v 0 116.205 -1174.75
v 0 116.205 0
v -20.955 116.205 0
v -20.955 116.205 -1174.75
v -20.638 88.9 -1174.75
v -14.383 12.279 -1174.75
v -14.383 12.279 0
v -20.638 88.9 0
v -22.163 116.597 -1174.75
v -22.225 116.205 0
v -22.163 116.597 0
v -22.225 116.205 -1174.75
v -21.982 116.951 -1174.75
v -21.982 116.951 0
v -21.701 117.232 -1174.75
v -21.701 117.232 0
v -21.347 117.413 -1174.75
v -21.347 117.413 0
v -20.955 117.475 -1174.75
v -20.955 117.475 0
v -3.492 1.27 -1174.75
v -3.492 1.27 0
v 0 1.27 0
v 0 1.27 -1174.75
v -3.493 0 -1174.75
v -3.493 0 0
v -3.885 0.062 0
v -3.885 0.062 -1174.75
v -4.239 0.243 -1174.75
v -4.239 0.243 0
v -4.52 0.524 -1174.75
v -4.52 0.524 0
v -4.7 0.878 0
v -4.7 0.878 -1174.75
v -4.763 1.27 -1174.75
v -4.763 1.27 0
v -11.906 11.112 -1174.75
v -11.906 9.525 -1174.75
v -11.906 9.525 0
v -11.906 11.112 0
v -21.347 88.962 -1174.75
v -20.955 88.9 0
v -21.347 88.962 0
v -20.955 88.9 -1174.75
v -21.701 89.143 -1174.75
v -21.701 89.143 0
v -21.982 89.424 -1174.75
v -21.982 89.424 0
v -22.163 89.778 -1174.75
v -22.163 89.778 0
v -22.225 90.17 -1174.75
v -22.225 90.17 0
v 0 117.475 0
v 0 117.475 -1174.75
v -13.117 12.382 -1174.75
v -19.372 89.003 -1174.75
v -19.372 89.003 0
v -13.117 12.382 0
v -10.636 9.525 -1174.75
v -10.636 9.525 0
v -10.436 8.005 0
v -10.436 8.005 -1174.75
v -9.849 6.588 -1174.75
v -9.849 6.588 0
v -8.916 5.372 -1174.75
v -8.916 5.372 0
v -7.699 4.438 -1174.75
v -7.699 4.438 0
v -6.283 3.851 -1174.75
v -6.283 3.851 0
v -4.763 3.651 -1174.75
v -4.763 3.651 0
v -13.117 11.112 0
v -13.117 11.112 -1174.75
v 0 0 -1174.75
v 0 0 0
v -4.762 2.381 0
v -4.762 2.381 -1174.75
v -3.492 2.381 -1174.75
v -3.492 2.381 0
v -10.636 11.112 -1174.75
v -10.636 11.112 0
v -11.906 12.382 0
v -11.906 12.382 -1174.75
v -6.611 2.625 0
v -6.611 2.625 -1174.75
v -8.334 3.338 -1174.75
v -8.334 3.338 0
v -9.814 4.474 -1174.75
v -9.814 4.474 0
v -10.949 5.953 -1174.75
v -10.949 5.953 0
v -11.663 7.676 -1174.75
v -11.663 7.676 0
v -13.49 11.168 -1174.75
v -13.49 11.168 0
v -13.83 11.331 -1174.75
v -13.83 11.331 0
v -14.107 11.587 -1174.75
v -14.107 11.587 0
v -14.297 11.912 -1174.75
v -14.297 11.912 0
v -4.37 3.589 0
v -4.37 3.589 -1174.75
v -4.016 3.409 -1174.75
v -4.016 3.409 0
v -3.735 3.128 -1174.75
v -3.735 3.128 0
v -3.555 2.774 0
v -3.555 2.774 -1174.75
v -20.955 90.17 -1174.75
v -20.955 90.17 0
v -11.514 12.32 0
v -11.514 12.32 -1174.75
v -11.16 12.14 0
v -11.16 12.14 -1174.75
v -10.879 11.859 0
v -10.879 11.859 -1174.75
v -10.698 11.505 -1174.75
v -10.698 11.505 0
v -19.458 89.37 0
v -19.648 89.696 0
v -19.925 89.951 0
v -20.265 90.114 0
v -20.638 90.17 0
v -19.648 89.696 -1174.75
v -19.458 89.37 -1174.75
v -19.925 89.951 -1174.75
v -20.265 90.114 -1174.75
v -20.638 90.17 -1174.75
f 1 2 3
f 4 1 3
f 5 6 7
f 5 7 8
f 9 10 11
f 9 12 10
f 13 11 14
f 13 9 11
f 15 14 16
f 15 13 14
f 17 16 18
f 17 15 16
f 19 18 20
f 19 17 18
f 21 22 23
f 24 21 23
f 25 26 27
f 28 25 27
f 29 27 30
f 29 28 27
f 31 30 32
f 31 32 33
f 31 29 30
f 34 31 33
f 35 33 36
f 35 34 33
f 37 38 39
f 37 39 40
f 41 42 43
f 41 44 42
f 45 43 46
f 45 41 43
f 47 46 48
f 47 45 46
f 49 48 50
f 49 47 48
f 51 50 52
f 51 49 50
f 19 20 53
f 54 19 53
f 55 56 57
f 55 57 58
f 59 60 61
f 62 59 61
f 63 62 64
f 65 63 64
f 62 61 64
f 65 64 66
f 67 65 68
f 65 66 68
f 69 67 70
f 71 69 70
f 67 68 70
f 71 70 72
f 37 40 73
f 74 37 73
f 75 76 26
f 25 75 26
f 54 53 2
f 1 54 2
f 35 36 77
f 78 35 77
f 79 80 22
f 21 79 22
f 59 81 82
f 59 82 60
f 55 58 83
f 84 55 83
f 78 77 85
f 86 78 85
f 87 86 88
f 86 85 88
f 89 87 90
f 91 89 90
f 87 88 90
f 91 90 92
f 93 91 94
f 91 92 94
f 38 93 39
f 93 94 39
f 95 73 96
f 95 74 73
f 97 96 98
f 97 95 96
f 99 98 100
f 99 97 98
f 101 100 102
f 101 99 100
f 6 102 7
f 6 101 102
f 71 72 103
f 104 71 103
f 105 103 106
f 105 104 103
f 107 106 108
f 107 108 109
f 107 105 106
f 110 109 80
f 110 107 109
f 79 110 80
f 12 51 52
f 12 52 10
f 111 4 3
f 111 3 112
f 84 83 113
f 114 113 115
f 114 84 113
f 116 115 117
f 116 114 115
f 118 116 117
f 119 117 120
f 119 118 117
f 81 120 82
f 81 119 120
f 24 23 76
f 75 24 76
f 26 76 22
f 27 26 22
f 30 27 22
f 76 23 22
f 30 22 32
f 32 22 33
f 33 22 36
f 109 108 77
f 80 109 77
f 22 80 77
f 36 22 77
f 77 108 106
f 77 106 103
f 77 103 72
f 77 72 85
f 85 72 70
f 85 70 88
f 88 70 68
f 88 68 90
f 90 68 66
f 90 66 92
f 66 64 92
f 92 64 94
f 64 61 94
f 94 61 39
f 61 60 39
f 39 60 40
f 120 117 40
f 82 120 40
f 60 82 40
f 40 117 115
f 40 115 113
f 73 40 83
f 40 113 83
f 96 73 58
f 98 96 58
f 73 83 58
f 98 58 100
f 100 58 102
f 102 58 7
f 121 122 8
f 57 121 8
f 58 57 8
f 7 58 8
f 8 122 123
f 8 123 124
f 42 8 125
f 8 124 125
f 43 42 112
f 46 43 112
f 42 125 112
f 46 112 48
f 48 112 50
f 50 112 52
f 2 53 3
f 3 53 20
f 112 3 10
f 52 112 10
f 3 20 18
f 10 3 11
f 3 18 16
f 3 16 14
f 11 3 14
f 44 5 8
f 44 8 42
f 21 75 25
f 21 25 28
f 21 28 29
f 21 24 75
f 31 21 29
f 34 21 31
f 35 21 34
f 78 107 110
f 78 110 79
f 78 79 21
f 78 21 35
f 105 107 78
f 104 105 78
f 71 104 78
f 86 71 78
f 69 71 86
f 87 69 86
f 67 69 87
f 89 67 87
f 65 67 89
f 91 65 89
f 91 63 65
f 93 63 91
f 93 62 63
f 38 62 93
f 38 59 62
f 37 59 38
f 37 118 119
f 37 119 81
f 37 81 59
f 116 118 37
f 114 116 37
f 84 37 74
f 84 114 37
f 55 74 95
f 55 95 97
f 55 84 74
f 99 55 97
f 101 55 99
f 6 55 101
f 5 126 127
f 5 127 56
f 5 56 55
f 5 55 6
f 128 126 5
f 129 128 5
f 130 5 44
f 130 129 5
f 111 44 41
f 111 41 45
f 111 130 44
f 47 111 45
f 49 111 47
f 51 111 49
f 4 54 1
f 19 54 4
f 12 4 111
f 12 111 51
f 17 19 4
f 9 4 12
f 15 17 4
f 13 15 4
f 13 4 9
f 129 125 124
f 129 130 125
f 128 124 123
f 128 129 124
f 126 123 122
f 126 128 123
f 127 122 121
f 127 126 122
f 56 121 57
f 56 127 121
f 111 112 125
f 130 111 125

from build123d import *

# Parameters (mm, degrees)
EXTRUDE_THIN1_DEPTH = 1174.75
FILLET1_R           = 1.27


with BuildPart() as part:
    # Sketch1 → Extrude-Thin1 (new body)
    with BuildSketch(Plane.XY):
        with BuildLine():
            Line((0, 0), (-4.7625, 0))
            Line((-4.7625, 0), (-4.7625, 2.38125))
            ThreePointArc((-4.7625, 2.38125), (-9.813894, 4.473606), (-11.90625, 9.525))
            Line((-11.90625, 9.525), (-11.90625, 11.1125))
            Line((-11.90625, 11.1125), (-14.2875, 11.1125))
            Line((-14.2875, 11.1125), (-20.6375, 88.9))
            Line((-20.6375, 88.9), (-22.225, 88.9))
            Line((-22.225, 88.9), (-22.225, 117.475))
            Line((-22.225, 117.475), (0, 117.475))
            Line((0, 117.475), (0, 116.205))
            Line((0, 116.205), (-20.955, 116.205))
            Line((-20.955, 116.205), (-20.955, 90.17))
            Line((-20.955, 90.17), (-19.466949, 90.17))
            Line((-19.466949, 90.17), (-13.116949, 12.3825))
            Line((-13.116949, 12.3825), (-10.63625, 12.3825))
            Line((-10.63625, 12.3825), (-10.63625, 9.525))
            ThreePointArc((-10.63625, 9.525), (-8.439542, 4.944574), (-3.4925, 3.790191))
            Line((-3.4925, 3.790191), (-3.4925, 1.27))
            Line((-3.4925, 1.27), (0, 1.27))
            Line((0, 1.27), (0, 0))
        make_face()
    extrude(amount=-EXTRUDE_THIN1_DEPTH)

    # Fillet1
    fillet1_edges = [part.edges().sort_by_distance(p)[0] for p in [
        (-19.466949, 90.17, -587.375),
        (-10.63625, 12.3825, -587.375),
        (-3.4925, 3.790191, -587.375),
        (-4.7625, 0, -587.375),
        (-14.2875, 11.1125, -587.375),
        (-22.225, 88.9, -587.375),
        (-22.225, 117.475, -587.375),
    ]]
    fillet(fillet1_edges, radius=FILLET1_R)


solid = part.part
